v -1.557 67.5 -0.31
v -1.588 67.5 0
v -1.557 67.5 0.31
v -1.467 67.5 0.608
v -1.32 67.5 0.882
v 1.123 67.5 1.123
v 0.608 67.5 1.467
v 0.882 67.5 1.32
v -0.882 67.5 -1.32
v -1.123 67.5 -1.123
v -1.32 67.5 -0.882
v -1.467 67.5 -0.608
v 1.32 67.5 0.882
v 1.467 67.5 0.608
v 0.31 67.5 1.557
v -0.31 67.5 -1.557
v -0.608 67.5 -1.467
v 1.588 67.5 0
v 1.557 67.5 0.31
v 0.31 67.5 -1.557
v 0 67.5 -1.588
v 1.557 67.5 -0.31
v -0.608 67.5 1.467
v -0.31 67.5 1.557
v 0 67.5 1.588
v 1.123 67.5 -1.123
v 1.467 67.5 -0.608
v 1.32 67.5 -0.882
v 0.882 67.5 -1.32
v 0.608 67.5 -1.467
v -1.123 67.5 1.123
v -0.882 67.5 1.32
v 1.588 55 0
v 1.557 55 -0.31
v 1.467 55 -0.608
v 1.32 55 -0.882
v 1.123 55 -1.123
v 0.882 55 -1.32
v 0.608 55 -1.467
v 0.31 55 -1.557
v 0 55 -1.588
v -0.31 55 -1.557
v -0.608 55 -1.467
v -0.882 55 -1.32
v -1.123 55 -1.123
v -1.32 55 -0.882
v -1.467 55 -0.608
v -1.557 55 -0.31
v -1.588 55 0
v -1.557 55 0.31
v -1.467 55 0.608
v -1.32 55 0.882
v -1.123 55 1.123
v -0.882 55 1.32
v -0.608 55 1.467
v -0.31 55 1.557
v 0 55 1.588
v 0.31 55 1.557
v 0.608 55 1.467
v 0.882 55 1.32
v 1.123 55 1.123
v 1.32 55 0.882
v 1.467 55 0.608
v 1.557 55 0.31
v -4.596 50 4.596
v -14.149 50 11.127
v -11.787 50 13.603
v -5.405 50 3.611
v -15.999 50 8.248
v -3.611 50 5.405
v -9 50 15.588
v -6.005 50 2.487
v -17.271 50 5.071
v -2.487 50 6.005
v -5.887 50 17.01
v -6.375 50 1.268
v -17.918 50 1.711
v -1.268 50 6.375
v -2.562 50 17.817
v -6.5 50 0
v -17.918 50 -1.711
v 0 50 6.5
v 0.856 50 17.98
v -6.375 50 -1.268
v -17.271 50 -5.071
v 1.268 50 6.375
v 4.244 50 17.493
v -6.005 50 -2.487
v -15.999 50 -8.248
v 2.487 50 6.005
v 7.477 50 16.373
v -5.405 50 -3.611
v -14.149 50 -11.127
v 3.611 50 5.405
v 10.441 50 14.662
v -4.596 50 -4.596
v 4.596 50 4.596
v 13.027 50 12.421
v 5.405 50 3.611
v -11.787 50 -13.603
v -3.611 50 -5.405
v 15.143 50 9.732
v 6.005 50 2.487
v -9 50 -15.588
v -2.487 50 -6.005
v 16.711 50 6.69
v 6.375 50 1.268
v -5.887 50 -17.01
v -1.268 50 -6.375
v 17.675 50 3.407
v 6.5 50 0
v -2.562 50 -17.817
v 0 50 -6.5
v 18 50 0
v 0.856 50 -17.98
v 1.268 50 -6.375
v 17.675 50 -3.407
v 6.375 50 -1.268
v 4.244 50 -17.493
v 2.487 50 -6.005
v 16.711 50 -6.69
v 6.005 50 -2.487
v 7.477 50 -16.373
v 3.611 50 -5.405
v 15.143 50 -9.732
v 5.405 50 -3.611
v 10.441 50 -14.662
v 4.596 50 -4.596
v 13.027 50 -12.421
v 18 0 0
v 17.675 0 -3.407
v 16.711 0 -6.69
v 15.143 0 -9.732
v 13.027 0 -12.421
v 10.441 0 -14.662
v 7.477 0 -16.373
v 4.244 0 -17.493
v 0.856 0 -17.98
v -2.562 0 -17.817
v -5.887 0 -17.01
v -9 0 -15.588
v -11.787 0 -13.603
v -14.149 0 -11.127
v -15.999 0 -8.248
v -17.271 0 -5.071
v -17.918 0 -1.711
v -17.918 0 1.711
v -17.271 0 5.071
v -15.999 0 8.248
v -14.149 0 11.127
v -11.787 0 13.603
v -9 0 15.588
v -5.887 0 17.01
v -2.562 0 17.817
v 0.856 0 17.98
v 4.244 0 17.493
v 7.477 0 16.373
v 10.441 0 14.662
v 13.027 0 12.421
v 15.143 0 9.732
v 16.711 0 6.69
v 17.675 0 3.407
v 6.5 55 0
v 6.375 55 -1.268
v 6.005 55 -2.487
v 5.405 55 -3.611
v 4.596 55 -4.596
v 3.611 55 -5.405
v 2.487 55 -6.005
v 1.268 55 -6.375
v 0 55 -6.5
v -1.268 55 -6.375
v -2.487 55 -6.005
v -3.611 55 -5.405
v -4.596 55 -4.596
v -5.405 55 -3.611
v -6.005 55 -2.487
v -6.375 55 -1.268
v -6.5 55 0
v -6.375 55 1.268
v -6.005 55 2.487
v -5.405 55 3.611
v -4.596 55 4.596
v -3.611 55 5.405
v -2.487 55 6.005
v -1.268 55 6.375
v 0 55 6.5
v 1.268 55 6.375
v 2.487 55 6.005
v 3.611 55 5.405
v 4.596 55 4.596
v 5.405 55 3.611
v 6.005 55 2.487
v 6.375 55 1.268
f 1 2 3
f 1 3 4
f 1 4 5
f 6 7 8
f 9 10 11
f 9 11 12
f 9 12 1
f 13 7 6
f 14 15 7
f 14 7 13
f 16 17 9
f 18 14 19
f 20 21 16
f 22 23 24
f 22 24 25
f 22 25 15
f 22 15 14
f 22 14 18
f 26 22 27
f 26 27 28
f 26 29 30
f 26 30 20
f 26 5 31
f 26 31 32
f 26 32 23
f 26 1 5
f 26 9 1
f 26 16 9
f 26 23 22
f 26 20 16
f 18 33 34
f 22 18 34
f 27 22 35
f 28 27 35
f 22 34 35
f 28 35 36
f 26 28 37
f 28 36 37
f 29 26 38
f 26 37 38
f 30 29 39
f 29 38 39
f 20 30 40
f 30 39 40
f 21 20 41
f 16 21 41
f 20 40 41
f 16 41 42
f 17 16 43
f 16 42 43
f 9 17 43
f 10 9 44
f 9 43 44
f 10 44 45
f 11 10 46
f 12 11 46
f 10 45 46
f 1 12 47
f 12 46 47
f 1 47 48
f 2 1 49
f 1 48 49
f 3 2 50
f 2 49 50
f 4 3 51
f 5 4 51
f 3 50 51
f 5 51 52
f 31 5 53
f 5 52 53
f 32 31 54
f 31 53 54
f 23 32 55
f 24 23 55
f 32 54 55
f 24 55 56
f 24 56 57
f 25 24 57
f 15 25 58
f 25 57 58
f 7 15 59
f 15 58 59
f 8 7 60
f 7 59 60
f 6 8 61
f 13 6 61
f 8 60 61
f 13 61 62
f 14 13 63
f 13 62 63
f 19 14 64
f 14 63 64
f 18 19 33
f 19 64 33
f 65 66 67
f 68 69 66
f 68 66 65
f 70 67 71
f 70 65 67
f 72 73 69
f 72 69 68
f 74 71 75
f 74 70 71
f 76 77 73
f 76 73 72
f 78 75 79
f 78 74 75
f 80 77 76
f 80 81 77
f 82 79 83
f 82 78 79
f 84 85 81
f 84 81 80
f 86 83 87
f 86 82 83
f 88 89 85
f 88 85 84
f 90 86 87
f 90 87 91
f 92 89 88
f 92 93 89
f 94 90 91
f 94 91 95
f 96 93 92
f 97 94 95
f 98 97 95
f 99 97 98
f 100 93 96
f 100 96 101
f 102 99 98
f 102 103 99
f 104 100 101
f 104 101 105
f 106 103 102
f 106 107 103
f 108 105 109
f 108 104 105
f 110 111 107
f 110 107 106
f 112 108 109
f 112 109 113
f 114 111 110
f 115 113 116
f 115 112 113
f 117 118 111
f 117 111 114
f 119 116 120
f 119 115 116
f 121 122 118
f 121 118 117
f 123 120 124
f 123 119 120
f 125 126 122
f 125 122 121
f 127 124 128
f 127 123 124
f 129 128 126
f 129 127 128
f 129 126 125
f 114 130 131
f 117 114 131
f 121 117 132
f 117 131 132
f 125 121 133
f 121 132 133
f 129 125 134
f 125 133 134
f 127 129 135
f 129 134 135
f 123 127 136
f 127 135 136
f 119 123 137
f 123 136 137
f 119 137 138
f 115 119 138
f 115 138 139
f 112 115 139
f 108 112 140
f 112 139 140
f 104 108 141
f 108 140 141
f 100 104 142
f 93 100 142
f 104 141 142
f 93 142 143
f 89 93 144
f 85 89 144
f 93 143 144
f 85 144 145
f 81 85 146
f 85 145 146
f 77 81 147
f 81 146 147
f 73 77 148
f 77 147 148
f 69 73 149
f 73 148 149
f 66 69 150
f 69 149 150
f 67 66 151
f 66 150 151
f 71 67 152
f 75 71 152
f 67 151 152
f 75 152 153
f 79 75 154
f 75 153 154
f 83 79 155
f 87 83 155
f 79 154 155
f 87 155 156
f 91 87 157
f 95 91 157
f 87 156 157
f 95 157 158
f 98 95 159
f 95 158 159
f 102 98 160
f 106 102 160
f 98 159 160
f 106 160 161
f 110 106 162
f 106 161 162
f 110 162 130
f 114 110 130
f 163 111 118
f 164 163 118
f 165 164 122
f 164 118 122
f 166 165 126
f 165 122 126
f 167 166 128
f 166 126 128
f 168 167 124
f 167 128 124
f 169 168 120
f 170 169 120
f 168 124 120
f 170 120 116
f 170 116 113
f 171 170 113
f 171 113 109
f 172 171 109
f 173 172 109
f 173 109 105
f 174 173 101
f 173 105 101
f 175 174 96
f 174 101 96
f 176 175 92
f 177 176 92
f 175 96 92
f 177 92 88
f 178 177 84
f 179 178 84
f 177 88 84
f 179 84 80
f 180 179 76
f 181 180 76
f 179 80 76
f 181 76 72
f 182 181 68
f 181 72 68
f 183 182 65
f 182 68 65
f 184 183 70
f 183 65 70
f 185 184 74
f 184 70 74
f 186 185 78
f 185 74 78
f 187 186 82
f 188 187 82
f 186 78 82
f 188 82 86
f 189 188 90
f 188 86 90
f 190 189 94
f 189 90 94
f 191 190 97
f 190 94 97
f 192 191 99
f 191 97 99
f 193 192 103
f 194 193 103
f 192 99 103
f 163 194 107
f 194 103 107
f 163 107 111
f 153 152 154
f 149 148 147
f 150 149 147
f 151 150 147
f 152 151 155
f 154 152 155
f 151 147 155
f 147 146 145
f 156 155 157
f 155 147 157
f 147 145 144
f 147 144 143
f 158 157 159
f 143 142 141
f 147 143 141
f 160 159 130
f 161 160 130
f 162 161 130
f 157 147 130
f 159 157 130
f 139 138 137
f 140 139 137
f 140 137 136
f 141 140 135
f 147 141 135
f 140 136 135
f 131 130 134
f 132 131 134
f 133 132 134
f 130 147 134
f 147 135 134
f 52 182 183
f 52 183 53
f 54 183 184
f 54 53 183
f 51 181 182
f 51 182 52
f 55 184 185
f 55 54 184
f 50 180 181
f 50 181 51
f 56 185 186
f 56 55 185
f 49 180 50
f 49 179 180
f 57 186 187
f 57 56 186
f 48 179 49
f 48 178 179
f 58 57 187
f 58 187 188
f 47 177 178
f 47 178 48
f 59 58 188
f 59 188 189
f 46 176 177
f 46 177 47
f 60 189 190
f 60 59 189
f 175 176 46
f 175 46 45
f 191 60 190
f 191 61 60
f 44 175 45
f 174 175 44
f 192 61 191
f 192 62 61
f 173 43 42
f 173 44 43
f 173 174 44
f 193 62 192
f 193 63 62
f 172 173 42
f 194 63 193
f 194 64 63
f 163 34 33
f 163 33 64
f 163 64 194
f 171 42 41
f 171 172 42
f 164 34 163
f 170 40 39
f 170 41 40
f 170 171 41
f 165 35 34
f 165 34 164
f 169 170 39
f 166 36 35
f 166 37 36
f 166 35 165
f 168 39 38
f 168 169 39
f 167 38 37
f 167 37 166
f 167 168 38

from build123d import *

# Parameters (mm, degrees)
SKETCH1_R           = 18
BOSS_EXTRUDE1_DEPTH = 50
BOSS_EXTRUDE2_START = 50
SKETCH2_R           = 6.5
BOSS_EXTRUDE2_DEPTH = 5
BOSS_EXTRUDE3_START = 55
SKETCH3_R           = 1.5875
BOSS_EXTRUDE3_DEPTH = 12.5


with BuildPart() as part:
    # Sketch1 → Boss-Extrude1 (new body)
    with BuildSketch(Plane(origin=(0, 0, 0), x_dir=(1, 0, 0), z_dir=(0, 1, 0))):
        Circle(SKETCH1_R)
    extrude(amount=BOSS_EXTRUDE1_DEPTH)

    # Sketch2 → Boss-Extrude2 (add)
    with BuildSketch(Plane(origin=(0, 0, 0), x_dir=(1, 0, 0), z_dir=(0, 1, 0)).offset(BOSS_EXTRUDE2_START)):
        Circle(SKETCH2_R)
    extrude(amount=BOSS_EXTRUDE2_DEPTH)

    # Sketch3 → Boss-Extrude3 (add)
    with BuildSketch(Plane(origin=(0, 0, 0), x_dir=(1, 0, 0), z_dir=(0, 1, 0)).offset(BOSS_EXTRUDE3_START)):
        Circle(SKETCH3_R)
    extrude(amount=BOSS_EXTRUDE3_DEPTH)


solid = part.part
